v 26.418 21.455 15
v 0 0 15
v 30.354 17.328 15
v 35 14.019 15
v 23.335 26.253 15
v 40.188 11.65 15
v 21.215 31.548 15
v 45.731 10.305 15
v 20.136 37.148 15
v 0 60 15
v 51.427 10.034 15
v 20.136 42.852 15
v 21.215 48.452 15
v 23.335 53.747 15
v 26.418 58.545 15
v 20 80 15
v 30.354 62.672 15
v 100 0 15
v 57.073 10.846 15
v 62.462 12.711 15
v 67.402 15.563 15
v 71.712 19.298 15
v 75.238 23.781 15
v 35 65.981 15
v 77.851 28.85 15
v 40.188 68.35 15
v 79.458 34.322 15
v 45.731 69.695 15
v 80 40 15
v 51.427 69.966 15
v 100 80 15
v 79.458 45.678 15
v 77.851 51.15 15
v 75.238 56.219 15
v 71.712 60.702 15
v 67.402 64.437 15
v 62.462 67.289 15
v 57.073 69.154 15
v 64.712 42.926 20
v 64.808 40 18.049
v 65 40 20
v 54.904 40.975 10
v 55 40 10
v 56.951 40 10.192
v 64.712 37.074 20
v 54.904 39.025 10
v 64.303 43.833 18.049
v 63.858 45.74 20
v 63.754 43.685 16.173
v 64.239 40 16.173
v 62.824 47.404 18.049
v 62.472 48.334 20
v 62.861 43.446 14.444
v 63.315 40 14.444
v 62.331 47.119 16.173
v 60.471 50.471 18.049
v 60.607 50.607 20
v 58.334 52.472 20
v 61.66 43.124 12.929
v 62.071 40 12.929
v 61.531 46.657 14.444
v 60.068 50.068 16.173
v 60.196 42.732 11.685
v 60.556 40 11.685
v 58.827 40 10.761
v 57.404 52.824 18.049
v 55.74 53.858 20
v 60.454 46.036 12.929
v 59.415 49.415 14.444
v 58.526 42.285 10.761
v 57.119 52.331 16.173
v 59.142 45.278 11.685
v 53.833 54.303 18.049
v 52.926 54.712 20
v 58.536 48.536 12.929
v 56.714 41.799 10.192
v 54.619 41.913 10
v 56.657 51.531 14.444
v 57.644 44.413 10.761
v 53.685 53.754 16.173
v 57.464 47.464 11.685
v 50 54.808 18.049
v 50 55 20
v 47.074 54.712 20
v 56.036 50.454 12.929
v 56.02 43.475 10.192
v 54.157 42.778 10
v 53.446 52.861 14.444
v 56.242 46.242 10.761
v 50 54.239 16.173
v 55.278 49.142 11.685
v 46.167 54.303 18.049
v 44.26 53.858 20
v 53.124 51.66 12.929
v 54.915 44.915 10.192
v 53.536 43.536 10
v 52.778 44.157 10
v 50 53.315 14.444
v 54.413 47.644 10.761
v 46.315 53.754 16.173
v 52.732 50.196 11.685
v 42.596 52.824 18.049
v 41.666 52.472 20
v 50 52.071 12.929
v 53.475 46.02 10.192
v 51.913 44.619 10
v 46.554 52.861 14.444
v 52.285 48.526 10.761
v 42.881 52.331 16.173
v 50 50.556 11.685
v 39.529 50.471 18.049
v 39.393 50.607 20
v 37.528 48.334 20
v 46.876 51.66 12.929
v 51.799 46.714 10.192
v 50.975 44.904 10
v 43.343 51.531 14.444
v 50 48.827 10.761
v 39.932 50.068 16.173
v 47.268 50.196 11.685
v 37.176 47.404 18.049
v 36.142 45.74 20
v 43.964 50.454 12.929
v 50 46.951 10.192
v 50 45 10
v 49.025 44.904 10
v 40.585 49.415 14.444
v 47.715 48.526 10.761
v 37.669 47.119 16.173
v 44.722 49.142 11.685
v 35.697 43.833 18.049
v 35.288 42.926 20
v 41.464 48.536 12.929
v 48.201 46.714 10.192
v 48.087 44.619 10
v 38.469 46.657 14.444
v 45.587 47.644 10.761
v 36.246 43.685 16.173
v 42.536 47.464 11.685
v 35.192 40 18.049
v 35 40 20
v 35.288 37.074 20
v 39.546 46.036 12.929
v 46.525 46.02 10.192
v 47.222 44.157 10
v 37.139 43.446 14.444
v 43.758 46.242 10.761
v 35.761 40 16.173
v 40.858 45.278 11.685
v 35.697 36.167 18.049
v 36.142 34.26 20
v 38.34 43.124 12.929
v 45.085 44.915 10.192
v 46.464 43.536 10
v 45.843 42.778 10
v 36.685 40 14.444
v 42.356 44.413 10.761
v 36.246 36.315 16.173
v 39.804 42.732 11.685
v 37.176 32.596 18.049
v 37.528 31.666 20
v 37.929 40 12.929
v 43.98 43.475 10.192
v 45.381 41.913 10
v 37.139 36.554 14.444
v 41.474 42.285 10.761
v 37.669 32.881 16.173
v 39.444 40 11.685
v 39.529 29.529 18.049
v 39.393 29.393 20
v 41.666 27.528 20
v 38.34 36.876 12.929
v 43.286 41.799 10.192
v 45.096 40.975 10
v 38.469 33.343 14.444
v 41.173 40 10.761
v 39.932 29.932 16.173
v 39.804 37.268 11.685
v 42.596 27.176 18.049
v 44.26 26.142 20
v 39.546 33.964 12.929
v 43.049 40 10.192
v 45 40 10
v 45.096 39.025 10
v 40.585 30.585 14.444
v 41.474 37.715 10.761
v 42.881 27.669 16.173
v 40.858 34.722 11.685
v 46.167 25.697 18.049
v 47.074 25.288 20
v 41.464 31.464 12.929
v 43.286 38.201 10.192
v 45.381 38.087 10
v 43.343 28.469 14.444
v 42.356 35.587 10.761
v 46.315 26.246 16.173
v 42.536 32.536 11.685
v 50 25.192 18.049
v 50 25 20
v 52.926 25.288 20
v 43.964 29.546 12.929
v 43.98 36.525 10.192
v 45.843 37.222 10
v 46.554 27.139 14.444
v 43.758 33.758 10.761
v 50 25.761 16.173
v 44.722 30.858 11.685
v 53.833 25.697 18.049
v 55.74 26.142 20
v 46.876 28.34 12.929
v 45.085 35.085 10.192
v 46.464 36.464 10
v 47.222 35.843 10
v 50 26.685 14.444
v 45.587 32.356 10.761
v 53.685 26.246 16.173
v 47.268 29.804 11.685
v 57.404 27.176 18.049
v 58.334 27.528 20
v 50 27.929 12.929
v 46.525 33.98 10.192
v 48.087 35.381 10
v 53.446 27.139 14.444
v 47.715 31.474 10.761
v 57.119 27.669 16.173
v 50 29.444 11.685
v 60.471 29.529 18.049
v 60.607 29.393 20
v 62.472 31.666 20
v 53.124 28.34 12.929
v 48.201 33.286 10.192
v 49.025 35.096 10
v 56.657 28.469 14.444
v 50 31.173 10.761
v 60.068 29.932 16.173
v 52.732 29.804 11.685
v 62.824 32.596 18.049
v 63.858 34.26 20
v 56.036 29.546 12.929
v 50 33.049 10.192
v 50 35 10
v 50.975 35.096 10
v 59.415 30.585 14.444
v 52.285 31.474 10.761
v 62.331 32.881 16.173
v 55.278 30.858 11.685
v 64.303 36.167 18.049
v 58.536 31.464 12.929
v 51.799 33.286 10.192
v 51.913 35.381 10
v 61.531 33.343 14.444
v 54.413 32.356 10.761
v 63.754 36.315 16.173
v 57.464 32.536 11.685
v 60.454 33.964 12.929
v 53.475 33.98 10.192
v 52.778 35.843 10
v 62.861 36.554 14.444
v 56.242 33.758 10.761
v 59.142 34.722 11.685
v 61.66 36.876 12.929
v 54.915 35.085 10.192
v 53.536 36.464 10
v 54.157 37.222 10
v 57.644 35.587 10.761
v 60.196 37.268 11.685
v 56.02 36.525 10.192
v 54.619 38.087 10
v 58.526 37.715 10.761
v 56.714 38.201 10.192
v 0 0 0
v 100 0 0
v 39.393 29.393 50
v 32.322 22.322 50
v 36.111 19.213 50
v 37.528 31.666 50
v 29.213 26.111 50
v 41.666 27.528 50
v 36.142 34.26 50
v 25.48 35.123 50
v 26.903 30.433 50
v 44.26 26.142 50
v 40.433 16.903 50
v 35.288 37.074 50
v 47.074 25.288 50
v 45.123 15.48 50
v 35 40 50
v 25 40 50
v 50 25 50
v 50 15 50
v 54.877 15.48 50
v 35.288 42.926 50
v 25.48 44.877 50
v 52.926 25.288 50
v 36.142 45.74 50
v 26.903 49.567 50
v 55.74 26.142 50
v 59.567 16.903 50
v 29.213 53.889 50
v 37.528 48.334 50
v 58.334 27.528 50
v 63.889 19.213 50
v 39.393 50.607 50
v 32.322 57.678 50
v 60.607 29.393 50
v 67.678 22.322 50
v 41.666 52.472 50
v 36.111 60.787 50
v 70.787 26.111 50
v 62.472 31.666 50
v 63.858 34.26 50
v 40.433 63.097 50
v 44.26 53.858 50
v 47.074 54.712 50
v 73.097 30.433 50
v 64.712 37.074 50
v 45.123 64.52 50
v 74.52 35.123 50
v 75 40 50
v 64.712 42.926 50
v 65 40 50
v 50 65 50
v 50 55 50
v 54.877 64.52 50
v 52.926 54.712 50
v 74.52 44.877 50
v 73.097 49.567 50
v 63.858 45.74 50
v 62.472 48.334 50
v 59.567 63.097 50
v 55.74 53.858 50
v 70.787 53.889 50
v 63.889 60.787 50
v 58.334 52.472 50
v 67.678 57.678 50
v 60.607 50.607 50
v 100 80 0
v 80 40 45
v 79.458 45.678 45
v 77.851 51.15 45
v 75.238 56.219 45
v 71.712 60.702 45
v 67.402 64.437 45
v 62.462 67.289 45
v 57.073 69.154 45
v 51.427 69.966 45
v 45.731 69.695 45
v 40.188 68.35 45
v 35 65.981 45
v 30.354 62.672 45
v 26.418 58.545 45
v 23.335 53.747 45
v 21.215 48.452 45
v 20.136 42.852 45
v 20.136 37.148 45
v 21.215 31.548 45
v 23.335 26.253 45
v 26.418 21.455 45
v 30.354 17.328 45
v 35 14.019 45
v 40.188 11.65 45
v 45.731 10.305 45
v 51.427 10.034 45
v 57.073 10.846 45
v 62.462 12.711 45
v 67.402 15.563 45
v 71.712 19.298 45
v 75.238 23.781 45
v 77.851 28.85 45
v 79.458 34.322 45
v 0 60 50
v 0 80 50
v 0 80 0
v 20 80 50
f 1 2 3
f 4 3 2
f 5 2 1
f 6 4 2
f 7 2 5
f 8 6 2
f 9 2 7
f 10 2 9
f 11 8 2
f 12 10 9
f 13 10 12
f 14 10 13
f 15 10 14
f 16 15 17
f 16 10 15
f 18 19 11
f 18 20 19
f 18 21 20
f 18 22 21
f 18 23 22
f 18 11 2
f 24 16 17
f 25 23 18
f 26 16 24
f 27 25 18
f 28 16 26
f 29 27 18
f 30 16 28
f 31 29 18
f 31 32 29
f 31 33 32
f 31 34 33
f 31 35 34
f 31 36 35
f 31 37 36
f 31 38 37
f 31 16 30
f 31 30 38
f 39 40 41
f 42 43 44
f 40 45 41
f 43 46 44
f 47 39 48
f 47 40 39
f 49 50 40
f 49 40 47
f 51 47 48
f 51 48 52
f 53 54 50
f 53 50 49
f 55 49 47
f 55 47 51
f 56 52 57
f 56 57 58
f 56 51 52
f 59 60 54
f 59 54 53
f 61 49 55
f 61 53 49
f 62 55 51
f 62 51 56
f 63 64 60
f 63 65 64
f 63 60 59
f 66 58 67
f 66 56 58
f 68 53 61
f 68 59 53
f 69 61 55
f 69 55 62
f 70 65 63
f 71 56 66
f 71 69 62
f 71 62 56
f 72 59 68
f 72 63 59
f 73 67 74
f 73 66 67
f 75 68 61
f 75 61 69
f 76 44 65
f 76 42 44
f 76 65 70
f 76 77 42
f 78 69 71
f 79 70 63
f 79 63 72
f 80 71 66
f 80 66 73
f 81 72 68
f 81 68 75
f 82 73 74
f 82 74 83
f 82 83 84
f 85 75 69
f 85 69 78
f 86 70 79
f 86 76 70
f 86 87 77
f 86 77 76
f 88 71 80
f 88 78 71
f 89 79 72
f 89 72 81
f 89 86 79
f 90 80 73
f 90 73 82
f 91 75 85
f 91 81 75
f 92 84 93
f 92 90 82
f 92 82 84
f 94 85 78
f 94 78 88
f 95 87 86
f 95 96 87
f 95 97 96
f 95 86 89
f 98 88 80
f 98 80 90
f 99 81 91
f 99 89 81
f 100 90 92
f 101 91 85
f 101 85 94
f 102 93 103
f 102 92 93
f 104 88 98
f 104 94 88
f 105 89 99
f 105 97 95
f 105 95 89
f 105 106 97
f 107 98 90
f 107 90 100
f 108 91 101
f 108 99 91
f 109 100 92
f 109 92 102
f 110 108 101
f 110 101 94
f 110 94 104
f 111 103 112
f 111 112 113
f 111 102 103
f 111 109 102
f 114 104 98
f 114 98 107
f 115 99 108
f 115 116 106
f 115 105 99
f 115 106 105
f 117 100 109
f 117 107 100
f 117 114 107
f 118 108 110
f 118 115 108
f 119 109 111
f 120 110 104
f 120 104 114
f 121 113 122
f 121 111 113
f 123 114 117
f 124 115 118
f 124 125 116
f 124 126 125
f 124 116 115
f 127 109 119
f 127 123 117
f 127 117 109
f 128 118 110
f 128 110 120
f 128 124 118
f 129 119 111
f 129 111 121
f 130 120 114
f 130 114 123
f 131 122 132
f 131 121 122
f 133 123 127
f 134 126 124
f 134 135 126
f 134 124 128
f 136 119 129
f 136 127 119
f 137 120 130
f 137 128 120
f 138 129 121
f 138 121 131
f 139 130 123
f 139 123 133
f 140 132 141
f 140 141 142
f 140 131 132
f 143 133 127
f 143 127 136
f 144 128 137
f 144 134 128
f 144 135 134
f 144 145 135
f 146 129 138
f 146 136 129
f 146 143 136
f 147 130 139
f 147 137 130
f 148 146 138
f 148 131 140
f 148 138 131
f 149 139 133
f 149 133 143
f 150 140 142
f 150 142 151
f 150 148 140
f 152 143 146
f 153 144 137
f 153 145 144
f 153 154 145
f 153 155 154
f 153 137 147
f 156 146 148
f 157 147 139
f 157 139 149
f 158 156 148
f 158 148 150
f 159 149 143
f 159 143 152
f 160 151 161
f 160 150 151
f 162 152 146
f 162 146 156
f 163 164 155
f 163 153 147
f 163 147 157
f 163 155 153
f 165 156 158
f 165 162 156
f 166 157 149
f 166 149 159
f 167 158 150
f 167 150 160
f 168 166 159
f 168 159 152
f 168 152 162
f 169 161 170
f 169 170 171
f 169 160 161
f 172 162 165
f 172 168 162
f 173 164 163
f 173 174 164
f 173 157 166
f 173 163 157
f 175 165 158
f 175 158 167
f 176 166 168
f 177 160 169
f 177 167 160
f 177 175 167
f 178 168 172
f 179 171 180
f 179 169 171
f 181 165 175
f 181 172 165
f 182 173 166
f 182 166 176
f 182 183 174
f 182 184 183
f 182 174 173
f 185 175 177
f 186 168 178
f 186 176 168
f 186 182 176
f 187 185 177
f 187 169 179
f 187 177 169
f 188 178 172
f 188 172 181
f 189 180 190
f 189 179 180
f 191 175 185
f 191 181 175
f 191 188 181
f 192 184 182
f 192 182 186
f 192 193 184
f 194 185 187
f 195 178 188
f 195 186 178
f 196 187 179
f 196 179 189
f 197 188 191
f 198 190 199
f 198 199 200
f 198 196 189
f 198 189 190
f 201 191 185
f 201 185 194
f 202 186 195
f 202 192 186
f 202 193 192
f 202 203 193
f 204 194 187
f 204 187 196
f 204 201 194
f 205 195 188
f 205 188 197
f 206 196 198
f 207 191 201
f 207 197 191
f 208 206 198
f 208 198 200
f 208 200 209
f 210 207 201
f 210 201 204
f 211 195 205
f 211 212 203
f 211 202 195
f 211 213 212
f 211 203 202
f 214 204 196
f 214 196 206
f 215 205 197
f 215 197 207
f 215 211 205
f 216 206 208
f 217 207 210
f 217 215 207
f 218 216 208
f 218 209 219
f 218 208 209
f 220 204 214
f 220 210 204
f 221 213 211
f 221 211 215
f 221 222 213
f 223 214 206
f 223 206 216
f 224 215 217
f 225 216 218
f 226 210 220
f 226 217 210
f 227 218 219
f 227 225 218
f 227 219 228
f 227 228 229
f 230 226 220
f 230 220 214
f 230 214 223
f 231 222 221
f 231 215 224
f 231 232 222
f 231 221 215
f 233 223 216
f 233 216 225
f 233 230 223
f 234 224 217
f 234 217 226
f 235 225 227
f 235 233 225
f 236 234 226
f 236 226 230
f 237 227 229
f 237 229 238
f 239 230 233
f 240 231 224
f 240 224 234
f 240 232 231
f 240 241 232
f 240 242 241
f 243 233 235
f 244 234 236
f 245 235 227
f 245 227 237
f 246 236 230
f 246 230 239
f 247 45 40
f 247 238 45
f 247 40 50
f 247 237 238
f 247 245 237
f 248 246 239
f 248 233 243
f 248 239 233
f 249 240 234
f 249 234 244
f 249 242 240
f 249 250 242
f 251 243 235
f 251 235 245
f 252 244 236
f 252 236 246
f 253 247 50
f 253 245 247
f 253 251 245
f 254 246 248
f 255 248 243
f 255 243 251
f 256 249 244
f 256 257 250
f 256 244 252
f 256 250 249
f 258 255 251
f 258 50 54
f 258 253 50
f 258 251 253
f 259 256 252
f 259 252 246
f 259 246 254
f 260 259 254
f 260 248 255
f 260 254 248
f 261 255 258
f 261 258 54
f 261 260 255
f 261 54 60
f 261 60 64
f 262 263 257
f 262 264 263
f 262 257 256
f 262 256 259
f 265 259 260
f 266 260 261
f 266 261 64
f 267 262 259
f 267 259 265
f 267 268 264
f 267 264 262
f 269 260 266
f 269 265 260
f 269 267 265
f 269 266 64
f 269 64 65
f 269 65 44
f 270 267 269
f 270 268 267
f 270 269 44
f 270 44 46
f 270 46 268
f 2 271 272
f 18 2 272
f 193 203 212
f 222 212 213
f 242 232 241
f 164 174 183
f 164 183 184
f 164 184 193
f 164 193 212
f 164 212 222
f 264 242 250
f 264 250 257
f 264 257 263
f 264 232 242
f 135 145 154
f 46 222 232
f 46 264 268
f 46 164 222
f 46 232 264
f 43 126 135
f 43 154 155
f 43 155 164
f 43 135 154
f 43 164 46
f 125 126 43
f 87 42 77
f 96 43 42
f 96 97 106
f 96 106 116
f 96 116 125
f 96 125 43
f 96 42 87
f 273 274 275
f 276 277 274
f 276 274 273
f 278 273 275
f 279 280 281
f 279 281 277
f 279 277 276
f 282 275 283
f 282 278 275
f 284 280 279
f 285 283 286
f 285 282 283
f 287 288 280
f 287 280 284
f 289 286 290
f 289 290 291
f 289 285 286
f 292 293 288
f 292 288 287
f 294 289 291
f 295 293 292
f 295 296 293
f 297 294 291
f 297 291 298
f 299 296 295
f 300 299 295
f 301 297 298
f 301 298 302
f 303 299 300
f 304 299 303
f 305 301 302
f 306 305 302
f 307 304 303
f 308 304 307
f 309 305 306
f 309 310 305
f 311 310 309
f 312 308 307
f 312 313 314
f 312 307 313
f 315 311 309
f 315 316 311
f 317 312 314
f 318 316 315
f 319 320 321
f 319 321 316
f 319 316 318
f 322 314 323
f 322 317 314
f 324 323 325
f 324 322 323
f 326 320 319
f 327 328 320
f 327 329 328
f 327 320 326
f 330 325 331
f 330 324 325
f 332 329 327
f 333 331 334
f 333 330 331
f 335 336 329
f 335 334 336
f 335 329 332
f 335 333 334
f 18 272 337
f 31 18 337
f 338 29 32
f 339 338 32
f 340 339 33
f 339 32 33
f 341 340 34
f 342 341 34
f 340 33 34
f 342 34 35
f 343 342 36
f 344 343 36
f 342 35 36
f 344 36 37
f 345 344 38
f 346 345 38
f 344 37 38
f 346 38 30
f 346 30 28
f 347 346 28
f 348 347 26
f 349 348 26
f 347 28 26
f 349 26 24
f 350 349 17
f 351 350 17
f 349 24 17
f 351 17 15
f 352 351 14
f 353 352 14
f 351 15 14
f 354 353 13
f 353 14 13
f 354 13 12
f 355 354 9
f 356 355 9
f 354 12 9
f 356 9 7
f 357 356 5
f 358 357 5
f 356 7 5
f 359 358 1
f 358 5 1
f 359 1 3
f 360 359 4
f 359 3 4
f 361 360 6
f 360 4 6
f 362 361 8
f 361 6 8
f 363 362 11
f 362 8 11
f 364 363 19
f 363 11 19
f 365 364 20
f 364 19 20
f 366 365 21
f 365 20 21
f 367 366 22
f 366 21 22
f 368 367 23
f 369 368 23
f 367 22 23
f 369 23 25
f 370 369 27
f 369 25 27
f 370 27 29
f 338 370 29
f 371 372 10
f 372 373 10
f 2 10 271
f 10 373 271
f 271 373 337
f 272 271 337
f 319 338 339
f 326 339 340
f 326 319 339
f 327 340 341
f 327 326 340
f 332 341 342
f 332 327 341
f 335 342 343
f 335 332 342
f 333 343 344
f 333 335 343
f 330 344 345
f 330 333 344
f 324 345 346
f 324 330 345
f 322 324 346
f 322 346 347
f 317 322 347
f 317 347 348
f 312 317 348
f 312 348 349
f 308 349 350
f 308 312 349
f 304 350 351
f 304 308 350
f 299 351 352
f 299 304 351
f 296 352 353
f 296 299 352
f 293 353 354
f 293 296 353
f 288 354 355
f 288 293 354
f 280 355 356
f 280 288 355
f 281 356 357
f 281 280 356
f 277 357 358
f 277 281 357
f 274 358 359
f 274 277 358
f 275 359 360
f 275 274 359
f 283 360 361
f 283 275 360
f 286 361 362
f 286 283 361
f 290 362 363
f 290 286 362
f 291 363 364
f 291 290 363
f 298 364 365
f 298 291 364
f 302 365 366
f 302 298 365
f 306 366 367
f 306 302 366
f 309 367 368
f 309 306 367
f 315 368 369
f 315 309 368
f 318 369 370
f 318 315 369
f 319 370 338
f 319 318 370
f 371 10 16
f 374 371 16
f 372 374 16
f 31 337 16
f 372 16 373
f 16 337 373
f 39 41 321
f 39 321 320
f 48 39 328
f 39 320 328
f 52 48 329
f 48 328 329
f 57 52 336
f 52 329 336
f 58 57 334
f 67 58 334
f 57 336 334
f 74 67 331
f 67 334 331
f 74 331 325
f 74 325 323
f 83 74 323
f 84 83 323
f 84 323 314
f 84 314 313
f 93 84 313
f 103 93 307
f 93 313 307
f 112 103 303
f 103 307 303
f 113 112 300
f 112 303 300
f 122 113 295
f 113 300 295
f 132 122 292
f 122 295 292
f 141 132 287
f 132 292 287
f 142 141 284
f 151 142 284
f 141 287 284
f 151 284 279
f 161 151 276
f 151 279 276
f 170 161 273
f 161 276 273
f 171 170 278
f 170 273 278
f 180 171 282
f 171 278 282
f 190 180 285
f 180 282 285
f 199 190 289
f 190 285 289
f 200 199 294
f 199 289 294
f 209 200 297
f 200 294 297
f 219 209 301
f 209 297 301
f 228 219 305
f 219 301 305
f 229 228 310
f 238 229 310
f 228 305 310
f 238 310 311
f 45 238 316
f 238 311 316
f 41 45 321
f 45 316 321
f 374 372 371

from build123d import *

# Parameters (mm, degrees)
F0_W     = 100
F0_H     = 80
F1_DEPTH = 15
F3_DEPTH = 35
F4_R     = 30
F5_DEPTH = 35
F6_SIZE  = 5
F7_R     = 15
F8_DEPTH = 40
F9_R     = 10


with BuildPart() as f1:
    # F0 (on Top) → F1 (new body)
    with BuildSketch(Plane.XY):
        with Locations((50, 40)):
            Rectangle(F0_W, F0_H)
    extrude(amount=F1_DEPTH)

    # F2 (on face) → F3 (join)
    with BuildSketch(Plane.XY.offset(15)):
        Polygon((20, 80), (0, 80), (0, 60), align=None)
    extrude(amount=F3_DEPTH)

    # F4 (on face) → F5 (join)
    with BuildSketch(Plane.XY.offset(15)):
        with Locations((50, 40)):
            Circle(F4_R)
    extrude(amount=F5_DEPTH)

    # F6
    f6_edges = [f1.edges().sort_by_distance(p)[0] for p in [
        (20, 40, 50),
    ]]
    chamfer(f6_edges, length=F6_SIZE)

    # F7 (on face) → F8 (cut)
    with BuildSketch(Plane.XY.offset(50)):
        with Locations((50, 40)):
            Circle(F7_R)
    extrude(amount=-F8_DEPTH, mode=Mode.SUBTRACT)

    # F9
    f9_edges = [f1.edges().sort_by_distance(p)[0] for p in [
        (35, 40, 10),
    ]]
    fillet(f9_edges, radius=F9_R)


solid = f1.part
